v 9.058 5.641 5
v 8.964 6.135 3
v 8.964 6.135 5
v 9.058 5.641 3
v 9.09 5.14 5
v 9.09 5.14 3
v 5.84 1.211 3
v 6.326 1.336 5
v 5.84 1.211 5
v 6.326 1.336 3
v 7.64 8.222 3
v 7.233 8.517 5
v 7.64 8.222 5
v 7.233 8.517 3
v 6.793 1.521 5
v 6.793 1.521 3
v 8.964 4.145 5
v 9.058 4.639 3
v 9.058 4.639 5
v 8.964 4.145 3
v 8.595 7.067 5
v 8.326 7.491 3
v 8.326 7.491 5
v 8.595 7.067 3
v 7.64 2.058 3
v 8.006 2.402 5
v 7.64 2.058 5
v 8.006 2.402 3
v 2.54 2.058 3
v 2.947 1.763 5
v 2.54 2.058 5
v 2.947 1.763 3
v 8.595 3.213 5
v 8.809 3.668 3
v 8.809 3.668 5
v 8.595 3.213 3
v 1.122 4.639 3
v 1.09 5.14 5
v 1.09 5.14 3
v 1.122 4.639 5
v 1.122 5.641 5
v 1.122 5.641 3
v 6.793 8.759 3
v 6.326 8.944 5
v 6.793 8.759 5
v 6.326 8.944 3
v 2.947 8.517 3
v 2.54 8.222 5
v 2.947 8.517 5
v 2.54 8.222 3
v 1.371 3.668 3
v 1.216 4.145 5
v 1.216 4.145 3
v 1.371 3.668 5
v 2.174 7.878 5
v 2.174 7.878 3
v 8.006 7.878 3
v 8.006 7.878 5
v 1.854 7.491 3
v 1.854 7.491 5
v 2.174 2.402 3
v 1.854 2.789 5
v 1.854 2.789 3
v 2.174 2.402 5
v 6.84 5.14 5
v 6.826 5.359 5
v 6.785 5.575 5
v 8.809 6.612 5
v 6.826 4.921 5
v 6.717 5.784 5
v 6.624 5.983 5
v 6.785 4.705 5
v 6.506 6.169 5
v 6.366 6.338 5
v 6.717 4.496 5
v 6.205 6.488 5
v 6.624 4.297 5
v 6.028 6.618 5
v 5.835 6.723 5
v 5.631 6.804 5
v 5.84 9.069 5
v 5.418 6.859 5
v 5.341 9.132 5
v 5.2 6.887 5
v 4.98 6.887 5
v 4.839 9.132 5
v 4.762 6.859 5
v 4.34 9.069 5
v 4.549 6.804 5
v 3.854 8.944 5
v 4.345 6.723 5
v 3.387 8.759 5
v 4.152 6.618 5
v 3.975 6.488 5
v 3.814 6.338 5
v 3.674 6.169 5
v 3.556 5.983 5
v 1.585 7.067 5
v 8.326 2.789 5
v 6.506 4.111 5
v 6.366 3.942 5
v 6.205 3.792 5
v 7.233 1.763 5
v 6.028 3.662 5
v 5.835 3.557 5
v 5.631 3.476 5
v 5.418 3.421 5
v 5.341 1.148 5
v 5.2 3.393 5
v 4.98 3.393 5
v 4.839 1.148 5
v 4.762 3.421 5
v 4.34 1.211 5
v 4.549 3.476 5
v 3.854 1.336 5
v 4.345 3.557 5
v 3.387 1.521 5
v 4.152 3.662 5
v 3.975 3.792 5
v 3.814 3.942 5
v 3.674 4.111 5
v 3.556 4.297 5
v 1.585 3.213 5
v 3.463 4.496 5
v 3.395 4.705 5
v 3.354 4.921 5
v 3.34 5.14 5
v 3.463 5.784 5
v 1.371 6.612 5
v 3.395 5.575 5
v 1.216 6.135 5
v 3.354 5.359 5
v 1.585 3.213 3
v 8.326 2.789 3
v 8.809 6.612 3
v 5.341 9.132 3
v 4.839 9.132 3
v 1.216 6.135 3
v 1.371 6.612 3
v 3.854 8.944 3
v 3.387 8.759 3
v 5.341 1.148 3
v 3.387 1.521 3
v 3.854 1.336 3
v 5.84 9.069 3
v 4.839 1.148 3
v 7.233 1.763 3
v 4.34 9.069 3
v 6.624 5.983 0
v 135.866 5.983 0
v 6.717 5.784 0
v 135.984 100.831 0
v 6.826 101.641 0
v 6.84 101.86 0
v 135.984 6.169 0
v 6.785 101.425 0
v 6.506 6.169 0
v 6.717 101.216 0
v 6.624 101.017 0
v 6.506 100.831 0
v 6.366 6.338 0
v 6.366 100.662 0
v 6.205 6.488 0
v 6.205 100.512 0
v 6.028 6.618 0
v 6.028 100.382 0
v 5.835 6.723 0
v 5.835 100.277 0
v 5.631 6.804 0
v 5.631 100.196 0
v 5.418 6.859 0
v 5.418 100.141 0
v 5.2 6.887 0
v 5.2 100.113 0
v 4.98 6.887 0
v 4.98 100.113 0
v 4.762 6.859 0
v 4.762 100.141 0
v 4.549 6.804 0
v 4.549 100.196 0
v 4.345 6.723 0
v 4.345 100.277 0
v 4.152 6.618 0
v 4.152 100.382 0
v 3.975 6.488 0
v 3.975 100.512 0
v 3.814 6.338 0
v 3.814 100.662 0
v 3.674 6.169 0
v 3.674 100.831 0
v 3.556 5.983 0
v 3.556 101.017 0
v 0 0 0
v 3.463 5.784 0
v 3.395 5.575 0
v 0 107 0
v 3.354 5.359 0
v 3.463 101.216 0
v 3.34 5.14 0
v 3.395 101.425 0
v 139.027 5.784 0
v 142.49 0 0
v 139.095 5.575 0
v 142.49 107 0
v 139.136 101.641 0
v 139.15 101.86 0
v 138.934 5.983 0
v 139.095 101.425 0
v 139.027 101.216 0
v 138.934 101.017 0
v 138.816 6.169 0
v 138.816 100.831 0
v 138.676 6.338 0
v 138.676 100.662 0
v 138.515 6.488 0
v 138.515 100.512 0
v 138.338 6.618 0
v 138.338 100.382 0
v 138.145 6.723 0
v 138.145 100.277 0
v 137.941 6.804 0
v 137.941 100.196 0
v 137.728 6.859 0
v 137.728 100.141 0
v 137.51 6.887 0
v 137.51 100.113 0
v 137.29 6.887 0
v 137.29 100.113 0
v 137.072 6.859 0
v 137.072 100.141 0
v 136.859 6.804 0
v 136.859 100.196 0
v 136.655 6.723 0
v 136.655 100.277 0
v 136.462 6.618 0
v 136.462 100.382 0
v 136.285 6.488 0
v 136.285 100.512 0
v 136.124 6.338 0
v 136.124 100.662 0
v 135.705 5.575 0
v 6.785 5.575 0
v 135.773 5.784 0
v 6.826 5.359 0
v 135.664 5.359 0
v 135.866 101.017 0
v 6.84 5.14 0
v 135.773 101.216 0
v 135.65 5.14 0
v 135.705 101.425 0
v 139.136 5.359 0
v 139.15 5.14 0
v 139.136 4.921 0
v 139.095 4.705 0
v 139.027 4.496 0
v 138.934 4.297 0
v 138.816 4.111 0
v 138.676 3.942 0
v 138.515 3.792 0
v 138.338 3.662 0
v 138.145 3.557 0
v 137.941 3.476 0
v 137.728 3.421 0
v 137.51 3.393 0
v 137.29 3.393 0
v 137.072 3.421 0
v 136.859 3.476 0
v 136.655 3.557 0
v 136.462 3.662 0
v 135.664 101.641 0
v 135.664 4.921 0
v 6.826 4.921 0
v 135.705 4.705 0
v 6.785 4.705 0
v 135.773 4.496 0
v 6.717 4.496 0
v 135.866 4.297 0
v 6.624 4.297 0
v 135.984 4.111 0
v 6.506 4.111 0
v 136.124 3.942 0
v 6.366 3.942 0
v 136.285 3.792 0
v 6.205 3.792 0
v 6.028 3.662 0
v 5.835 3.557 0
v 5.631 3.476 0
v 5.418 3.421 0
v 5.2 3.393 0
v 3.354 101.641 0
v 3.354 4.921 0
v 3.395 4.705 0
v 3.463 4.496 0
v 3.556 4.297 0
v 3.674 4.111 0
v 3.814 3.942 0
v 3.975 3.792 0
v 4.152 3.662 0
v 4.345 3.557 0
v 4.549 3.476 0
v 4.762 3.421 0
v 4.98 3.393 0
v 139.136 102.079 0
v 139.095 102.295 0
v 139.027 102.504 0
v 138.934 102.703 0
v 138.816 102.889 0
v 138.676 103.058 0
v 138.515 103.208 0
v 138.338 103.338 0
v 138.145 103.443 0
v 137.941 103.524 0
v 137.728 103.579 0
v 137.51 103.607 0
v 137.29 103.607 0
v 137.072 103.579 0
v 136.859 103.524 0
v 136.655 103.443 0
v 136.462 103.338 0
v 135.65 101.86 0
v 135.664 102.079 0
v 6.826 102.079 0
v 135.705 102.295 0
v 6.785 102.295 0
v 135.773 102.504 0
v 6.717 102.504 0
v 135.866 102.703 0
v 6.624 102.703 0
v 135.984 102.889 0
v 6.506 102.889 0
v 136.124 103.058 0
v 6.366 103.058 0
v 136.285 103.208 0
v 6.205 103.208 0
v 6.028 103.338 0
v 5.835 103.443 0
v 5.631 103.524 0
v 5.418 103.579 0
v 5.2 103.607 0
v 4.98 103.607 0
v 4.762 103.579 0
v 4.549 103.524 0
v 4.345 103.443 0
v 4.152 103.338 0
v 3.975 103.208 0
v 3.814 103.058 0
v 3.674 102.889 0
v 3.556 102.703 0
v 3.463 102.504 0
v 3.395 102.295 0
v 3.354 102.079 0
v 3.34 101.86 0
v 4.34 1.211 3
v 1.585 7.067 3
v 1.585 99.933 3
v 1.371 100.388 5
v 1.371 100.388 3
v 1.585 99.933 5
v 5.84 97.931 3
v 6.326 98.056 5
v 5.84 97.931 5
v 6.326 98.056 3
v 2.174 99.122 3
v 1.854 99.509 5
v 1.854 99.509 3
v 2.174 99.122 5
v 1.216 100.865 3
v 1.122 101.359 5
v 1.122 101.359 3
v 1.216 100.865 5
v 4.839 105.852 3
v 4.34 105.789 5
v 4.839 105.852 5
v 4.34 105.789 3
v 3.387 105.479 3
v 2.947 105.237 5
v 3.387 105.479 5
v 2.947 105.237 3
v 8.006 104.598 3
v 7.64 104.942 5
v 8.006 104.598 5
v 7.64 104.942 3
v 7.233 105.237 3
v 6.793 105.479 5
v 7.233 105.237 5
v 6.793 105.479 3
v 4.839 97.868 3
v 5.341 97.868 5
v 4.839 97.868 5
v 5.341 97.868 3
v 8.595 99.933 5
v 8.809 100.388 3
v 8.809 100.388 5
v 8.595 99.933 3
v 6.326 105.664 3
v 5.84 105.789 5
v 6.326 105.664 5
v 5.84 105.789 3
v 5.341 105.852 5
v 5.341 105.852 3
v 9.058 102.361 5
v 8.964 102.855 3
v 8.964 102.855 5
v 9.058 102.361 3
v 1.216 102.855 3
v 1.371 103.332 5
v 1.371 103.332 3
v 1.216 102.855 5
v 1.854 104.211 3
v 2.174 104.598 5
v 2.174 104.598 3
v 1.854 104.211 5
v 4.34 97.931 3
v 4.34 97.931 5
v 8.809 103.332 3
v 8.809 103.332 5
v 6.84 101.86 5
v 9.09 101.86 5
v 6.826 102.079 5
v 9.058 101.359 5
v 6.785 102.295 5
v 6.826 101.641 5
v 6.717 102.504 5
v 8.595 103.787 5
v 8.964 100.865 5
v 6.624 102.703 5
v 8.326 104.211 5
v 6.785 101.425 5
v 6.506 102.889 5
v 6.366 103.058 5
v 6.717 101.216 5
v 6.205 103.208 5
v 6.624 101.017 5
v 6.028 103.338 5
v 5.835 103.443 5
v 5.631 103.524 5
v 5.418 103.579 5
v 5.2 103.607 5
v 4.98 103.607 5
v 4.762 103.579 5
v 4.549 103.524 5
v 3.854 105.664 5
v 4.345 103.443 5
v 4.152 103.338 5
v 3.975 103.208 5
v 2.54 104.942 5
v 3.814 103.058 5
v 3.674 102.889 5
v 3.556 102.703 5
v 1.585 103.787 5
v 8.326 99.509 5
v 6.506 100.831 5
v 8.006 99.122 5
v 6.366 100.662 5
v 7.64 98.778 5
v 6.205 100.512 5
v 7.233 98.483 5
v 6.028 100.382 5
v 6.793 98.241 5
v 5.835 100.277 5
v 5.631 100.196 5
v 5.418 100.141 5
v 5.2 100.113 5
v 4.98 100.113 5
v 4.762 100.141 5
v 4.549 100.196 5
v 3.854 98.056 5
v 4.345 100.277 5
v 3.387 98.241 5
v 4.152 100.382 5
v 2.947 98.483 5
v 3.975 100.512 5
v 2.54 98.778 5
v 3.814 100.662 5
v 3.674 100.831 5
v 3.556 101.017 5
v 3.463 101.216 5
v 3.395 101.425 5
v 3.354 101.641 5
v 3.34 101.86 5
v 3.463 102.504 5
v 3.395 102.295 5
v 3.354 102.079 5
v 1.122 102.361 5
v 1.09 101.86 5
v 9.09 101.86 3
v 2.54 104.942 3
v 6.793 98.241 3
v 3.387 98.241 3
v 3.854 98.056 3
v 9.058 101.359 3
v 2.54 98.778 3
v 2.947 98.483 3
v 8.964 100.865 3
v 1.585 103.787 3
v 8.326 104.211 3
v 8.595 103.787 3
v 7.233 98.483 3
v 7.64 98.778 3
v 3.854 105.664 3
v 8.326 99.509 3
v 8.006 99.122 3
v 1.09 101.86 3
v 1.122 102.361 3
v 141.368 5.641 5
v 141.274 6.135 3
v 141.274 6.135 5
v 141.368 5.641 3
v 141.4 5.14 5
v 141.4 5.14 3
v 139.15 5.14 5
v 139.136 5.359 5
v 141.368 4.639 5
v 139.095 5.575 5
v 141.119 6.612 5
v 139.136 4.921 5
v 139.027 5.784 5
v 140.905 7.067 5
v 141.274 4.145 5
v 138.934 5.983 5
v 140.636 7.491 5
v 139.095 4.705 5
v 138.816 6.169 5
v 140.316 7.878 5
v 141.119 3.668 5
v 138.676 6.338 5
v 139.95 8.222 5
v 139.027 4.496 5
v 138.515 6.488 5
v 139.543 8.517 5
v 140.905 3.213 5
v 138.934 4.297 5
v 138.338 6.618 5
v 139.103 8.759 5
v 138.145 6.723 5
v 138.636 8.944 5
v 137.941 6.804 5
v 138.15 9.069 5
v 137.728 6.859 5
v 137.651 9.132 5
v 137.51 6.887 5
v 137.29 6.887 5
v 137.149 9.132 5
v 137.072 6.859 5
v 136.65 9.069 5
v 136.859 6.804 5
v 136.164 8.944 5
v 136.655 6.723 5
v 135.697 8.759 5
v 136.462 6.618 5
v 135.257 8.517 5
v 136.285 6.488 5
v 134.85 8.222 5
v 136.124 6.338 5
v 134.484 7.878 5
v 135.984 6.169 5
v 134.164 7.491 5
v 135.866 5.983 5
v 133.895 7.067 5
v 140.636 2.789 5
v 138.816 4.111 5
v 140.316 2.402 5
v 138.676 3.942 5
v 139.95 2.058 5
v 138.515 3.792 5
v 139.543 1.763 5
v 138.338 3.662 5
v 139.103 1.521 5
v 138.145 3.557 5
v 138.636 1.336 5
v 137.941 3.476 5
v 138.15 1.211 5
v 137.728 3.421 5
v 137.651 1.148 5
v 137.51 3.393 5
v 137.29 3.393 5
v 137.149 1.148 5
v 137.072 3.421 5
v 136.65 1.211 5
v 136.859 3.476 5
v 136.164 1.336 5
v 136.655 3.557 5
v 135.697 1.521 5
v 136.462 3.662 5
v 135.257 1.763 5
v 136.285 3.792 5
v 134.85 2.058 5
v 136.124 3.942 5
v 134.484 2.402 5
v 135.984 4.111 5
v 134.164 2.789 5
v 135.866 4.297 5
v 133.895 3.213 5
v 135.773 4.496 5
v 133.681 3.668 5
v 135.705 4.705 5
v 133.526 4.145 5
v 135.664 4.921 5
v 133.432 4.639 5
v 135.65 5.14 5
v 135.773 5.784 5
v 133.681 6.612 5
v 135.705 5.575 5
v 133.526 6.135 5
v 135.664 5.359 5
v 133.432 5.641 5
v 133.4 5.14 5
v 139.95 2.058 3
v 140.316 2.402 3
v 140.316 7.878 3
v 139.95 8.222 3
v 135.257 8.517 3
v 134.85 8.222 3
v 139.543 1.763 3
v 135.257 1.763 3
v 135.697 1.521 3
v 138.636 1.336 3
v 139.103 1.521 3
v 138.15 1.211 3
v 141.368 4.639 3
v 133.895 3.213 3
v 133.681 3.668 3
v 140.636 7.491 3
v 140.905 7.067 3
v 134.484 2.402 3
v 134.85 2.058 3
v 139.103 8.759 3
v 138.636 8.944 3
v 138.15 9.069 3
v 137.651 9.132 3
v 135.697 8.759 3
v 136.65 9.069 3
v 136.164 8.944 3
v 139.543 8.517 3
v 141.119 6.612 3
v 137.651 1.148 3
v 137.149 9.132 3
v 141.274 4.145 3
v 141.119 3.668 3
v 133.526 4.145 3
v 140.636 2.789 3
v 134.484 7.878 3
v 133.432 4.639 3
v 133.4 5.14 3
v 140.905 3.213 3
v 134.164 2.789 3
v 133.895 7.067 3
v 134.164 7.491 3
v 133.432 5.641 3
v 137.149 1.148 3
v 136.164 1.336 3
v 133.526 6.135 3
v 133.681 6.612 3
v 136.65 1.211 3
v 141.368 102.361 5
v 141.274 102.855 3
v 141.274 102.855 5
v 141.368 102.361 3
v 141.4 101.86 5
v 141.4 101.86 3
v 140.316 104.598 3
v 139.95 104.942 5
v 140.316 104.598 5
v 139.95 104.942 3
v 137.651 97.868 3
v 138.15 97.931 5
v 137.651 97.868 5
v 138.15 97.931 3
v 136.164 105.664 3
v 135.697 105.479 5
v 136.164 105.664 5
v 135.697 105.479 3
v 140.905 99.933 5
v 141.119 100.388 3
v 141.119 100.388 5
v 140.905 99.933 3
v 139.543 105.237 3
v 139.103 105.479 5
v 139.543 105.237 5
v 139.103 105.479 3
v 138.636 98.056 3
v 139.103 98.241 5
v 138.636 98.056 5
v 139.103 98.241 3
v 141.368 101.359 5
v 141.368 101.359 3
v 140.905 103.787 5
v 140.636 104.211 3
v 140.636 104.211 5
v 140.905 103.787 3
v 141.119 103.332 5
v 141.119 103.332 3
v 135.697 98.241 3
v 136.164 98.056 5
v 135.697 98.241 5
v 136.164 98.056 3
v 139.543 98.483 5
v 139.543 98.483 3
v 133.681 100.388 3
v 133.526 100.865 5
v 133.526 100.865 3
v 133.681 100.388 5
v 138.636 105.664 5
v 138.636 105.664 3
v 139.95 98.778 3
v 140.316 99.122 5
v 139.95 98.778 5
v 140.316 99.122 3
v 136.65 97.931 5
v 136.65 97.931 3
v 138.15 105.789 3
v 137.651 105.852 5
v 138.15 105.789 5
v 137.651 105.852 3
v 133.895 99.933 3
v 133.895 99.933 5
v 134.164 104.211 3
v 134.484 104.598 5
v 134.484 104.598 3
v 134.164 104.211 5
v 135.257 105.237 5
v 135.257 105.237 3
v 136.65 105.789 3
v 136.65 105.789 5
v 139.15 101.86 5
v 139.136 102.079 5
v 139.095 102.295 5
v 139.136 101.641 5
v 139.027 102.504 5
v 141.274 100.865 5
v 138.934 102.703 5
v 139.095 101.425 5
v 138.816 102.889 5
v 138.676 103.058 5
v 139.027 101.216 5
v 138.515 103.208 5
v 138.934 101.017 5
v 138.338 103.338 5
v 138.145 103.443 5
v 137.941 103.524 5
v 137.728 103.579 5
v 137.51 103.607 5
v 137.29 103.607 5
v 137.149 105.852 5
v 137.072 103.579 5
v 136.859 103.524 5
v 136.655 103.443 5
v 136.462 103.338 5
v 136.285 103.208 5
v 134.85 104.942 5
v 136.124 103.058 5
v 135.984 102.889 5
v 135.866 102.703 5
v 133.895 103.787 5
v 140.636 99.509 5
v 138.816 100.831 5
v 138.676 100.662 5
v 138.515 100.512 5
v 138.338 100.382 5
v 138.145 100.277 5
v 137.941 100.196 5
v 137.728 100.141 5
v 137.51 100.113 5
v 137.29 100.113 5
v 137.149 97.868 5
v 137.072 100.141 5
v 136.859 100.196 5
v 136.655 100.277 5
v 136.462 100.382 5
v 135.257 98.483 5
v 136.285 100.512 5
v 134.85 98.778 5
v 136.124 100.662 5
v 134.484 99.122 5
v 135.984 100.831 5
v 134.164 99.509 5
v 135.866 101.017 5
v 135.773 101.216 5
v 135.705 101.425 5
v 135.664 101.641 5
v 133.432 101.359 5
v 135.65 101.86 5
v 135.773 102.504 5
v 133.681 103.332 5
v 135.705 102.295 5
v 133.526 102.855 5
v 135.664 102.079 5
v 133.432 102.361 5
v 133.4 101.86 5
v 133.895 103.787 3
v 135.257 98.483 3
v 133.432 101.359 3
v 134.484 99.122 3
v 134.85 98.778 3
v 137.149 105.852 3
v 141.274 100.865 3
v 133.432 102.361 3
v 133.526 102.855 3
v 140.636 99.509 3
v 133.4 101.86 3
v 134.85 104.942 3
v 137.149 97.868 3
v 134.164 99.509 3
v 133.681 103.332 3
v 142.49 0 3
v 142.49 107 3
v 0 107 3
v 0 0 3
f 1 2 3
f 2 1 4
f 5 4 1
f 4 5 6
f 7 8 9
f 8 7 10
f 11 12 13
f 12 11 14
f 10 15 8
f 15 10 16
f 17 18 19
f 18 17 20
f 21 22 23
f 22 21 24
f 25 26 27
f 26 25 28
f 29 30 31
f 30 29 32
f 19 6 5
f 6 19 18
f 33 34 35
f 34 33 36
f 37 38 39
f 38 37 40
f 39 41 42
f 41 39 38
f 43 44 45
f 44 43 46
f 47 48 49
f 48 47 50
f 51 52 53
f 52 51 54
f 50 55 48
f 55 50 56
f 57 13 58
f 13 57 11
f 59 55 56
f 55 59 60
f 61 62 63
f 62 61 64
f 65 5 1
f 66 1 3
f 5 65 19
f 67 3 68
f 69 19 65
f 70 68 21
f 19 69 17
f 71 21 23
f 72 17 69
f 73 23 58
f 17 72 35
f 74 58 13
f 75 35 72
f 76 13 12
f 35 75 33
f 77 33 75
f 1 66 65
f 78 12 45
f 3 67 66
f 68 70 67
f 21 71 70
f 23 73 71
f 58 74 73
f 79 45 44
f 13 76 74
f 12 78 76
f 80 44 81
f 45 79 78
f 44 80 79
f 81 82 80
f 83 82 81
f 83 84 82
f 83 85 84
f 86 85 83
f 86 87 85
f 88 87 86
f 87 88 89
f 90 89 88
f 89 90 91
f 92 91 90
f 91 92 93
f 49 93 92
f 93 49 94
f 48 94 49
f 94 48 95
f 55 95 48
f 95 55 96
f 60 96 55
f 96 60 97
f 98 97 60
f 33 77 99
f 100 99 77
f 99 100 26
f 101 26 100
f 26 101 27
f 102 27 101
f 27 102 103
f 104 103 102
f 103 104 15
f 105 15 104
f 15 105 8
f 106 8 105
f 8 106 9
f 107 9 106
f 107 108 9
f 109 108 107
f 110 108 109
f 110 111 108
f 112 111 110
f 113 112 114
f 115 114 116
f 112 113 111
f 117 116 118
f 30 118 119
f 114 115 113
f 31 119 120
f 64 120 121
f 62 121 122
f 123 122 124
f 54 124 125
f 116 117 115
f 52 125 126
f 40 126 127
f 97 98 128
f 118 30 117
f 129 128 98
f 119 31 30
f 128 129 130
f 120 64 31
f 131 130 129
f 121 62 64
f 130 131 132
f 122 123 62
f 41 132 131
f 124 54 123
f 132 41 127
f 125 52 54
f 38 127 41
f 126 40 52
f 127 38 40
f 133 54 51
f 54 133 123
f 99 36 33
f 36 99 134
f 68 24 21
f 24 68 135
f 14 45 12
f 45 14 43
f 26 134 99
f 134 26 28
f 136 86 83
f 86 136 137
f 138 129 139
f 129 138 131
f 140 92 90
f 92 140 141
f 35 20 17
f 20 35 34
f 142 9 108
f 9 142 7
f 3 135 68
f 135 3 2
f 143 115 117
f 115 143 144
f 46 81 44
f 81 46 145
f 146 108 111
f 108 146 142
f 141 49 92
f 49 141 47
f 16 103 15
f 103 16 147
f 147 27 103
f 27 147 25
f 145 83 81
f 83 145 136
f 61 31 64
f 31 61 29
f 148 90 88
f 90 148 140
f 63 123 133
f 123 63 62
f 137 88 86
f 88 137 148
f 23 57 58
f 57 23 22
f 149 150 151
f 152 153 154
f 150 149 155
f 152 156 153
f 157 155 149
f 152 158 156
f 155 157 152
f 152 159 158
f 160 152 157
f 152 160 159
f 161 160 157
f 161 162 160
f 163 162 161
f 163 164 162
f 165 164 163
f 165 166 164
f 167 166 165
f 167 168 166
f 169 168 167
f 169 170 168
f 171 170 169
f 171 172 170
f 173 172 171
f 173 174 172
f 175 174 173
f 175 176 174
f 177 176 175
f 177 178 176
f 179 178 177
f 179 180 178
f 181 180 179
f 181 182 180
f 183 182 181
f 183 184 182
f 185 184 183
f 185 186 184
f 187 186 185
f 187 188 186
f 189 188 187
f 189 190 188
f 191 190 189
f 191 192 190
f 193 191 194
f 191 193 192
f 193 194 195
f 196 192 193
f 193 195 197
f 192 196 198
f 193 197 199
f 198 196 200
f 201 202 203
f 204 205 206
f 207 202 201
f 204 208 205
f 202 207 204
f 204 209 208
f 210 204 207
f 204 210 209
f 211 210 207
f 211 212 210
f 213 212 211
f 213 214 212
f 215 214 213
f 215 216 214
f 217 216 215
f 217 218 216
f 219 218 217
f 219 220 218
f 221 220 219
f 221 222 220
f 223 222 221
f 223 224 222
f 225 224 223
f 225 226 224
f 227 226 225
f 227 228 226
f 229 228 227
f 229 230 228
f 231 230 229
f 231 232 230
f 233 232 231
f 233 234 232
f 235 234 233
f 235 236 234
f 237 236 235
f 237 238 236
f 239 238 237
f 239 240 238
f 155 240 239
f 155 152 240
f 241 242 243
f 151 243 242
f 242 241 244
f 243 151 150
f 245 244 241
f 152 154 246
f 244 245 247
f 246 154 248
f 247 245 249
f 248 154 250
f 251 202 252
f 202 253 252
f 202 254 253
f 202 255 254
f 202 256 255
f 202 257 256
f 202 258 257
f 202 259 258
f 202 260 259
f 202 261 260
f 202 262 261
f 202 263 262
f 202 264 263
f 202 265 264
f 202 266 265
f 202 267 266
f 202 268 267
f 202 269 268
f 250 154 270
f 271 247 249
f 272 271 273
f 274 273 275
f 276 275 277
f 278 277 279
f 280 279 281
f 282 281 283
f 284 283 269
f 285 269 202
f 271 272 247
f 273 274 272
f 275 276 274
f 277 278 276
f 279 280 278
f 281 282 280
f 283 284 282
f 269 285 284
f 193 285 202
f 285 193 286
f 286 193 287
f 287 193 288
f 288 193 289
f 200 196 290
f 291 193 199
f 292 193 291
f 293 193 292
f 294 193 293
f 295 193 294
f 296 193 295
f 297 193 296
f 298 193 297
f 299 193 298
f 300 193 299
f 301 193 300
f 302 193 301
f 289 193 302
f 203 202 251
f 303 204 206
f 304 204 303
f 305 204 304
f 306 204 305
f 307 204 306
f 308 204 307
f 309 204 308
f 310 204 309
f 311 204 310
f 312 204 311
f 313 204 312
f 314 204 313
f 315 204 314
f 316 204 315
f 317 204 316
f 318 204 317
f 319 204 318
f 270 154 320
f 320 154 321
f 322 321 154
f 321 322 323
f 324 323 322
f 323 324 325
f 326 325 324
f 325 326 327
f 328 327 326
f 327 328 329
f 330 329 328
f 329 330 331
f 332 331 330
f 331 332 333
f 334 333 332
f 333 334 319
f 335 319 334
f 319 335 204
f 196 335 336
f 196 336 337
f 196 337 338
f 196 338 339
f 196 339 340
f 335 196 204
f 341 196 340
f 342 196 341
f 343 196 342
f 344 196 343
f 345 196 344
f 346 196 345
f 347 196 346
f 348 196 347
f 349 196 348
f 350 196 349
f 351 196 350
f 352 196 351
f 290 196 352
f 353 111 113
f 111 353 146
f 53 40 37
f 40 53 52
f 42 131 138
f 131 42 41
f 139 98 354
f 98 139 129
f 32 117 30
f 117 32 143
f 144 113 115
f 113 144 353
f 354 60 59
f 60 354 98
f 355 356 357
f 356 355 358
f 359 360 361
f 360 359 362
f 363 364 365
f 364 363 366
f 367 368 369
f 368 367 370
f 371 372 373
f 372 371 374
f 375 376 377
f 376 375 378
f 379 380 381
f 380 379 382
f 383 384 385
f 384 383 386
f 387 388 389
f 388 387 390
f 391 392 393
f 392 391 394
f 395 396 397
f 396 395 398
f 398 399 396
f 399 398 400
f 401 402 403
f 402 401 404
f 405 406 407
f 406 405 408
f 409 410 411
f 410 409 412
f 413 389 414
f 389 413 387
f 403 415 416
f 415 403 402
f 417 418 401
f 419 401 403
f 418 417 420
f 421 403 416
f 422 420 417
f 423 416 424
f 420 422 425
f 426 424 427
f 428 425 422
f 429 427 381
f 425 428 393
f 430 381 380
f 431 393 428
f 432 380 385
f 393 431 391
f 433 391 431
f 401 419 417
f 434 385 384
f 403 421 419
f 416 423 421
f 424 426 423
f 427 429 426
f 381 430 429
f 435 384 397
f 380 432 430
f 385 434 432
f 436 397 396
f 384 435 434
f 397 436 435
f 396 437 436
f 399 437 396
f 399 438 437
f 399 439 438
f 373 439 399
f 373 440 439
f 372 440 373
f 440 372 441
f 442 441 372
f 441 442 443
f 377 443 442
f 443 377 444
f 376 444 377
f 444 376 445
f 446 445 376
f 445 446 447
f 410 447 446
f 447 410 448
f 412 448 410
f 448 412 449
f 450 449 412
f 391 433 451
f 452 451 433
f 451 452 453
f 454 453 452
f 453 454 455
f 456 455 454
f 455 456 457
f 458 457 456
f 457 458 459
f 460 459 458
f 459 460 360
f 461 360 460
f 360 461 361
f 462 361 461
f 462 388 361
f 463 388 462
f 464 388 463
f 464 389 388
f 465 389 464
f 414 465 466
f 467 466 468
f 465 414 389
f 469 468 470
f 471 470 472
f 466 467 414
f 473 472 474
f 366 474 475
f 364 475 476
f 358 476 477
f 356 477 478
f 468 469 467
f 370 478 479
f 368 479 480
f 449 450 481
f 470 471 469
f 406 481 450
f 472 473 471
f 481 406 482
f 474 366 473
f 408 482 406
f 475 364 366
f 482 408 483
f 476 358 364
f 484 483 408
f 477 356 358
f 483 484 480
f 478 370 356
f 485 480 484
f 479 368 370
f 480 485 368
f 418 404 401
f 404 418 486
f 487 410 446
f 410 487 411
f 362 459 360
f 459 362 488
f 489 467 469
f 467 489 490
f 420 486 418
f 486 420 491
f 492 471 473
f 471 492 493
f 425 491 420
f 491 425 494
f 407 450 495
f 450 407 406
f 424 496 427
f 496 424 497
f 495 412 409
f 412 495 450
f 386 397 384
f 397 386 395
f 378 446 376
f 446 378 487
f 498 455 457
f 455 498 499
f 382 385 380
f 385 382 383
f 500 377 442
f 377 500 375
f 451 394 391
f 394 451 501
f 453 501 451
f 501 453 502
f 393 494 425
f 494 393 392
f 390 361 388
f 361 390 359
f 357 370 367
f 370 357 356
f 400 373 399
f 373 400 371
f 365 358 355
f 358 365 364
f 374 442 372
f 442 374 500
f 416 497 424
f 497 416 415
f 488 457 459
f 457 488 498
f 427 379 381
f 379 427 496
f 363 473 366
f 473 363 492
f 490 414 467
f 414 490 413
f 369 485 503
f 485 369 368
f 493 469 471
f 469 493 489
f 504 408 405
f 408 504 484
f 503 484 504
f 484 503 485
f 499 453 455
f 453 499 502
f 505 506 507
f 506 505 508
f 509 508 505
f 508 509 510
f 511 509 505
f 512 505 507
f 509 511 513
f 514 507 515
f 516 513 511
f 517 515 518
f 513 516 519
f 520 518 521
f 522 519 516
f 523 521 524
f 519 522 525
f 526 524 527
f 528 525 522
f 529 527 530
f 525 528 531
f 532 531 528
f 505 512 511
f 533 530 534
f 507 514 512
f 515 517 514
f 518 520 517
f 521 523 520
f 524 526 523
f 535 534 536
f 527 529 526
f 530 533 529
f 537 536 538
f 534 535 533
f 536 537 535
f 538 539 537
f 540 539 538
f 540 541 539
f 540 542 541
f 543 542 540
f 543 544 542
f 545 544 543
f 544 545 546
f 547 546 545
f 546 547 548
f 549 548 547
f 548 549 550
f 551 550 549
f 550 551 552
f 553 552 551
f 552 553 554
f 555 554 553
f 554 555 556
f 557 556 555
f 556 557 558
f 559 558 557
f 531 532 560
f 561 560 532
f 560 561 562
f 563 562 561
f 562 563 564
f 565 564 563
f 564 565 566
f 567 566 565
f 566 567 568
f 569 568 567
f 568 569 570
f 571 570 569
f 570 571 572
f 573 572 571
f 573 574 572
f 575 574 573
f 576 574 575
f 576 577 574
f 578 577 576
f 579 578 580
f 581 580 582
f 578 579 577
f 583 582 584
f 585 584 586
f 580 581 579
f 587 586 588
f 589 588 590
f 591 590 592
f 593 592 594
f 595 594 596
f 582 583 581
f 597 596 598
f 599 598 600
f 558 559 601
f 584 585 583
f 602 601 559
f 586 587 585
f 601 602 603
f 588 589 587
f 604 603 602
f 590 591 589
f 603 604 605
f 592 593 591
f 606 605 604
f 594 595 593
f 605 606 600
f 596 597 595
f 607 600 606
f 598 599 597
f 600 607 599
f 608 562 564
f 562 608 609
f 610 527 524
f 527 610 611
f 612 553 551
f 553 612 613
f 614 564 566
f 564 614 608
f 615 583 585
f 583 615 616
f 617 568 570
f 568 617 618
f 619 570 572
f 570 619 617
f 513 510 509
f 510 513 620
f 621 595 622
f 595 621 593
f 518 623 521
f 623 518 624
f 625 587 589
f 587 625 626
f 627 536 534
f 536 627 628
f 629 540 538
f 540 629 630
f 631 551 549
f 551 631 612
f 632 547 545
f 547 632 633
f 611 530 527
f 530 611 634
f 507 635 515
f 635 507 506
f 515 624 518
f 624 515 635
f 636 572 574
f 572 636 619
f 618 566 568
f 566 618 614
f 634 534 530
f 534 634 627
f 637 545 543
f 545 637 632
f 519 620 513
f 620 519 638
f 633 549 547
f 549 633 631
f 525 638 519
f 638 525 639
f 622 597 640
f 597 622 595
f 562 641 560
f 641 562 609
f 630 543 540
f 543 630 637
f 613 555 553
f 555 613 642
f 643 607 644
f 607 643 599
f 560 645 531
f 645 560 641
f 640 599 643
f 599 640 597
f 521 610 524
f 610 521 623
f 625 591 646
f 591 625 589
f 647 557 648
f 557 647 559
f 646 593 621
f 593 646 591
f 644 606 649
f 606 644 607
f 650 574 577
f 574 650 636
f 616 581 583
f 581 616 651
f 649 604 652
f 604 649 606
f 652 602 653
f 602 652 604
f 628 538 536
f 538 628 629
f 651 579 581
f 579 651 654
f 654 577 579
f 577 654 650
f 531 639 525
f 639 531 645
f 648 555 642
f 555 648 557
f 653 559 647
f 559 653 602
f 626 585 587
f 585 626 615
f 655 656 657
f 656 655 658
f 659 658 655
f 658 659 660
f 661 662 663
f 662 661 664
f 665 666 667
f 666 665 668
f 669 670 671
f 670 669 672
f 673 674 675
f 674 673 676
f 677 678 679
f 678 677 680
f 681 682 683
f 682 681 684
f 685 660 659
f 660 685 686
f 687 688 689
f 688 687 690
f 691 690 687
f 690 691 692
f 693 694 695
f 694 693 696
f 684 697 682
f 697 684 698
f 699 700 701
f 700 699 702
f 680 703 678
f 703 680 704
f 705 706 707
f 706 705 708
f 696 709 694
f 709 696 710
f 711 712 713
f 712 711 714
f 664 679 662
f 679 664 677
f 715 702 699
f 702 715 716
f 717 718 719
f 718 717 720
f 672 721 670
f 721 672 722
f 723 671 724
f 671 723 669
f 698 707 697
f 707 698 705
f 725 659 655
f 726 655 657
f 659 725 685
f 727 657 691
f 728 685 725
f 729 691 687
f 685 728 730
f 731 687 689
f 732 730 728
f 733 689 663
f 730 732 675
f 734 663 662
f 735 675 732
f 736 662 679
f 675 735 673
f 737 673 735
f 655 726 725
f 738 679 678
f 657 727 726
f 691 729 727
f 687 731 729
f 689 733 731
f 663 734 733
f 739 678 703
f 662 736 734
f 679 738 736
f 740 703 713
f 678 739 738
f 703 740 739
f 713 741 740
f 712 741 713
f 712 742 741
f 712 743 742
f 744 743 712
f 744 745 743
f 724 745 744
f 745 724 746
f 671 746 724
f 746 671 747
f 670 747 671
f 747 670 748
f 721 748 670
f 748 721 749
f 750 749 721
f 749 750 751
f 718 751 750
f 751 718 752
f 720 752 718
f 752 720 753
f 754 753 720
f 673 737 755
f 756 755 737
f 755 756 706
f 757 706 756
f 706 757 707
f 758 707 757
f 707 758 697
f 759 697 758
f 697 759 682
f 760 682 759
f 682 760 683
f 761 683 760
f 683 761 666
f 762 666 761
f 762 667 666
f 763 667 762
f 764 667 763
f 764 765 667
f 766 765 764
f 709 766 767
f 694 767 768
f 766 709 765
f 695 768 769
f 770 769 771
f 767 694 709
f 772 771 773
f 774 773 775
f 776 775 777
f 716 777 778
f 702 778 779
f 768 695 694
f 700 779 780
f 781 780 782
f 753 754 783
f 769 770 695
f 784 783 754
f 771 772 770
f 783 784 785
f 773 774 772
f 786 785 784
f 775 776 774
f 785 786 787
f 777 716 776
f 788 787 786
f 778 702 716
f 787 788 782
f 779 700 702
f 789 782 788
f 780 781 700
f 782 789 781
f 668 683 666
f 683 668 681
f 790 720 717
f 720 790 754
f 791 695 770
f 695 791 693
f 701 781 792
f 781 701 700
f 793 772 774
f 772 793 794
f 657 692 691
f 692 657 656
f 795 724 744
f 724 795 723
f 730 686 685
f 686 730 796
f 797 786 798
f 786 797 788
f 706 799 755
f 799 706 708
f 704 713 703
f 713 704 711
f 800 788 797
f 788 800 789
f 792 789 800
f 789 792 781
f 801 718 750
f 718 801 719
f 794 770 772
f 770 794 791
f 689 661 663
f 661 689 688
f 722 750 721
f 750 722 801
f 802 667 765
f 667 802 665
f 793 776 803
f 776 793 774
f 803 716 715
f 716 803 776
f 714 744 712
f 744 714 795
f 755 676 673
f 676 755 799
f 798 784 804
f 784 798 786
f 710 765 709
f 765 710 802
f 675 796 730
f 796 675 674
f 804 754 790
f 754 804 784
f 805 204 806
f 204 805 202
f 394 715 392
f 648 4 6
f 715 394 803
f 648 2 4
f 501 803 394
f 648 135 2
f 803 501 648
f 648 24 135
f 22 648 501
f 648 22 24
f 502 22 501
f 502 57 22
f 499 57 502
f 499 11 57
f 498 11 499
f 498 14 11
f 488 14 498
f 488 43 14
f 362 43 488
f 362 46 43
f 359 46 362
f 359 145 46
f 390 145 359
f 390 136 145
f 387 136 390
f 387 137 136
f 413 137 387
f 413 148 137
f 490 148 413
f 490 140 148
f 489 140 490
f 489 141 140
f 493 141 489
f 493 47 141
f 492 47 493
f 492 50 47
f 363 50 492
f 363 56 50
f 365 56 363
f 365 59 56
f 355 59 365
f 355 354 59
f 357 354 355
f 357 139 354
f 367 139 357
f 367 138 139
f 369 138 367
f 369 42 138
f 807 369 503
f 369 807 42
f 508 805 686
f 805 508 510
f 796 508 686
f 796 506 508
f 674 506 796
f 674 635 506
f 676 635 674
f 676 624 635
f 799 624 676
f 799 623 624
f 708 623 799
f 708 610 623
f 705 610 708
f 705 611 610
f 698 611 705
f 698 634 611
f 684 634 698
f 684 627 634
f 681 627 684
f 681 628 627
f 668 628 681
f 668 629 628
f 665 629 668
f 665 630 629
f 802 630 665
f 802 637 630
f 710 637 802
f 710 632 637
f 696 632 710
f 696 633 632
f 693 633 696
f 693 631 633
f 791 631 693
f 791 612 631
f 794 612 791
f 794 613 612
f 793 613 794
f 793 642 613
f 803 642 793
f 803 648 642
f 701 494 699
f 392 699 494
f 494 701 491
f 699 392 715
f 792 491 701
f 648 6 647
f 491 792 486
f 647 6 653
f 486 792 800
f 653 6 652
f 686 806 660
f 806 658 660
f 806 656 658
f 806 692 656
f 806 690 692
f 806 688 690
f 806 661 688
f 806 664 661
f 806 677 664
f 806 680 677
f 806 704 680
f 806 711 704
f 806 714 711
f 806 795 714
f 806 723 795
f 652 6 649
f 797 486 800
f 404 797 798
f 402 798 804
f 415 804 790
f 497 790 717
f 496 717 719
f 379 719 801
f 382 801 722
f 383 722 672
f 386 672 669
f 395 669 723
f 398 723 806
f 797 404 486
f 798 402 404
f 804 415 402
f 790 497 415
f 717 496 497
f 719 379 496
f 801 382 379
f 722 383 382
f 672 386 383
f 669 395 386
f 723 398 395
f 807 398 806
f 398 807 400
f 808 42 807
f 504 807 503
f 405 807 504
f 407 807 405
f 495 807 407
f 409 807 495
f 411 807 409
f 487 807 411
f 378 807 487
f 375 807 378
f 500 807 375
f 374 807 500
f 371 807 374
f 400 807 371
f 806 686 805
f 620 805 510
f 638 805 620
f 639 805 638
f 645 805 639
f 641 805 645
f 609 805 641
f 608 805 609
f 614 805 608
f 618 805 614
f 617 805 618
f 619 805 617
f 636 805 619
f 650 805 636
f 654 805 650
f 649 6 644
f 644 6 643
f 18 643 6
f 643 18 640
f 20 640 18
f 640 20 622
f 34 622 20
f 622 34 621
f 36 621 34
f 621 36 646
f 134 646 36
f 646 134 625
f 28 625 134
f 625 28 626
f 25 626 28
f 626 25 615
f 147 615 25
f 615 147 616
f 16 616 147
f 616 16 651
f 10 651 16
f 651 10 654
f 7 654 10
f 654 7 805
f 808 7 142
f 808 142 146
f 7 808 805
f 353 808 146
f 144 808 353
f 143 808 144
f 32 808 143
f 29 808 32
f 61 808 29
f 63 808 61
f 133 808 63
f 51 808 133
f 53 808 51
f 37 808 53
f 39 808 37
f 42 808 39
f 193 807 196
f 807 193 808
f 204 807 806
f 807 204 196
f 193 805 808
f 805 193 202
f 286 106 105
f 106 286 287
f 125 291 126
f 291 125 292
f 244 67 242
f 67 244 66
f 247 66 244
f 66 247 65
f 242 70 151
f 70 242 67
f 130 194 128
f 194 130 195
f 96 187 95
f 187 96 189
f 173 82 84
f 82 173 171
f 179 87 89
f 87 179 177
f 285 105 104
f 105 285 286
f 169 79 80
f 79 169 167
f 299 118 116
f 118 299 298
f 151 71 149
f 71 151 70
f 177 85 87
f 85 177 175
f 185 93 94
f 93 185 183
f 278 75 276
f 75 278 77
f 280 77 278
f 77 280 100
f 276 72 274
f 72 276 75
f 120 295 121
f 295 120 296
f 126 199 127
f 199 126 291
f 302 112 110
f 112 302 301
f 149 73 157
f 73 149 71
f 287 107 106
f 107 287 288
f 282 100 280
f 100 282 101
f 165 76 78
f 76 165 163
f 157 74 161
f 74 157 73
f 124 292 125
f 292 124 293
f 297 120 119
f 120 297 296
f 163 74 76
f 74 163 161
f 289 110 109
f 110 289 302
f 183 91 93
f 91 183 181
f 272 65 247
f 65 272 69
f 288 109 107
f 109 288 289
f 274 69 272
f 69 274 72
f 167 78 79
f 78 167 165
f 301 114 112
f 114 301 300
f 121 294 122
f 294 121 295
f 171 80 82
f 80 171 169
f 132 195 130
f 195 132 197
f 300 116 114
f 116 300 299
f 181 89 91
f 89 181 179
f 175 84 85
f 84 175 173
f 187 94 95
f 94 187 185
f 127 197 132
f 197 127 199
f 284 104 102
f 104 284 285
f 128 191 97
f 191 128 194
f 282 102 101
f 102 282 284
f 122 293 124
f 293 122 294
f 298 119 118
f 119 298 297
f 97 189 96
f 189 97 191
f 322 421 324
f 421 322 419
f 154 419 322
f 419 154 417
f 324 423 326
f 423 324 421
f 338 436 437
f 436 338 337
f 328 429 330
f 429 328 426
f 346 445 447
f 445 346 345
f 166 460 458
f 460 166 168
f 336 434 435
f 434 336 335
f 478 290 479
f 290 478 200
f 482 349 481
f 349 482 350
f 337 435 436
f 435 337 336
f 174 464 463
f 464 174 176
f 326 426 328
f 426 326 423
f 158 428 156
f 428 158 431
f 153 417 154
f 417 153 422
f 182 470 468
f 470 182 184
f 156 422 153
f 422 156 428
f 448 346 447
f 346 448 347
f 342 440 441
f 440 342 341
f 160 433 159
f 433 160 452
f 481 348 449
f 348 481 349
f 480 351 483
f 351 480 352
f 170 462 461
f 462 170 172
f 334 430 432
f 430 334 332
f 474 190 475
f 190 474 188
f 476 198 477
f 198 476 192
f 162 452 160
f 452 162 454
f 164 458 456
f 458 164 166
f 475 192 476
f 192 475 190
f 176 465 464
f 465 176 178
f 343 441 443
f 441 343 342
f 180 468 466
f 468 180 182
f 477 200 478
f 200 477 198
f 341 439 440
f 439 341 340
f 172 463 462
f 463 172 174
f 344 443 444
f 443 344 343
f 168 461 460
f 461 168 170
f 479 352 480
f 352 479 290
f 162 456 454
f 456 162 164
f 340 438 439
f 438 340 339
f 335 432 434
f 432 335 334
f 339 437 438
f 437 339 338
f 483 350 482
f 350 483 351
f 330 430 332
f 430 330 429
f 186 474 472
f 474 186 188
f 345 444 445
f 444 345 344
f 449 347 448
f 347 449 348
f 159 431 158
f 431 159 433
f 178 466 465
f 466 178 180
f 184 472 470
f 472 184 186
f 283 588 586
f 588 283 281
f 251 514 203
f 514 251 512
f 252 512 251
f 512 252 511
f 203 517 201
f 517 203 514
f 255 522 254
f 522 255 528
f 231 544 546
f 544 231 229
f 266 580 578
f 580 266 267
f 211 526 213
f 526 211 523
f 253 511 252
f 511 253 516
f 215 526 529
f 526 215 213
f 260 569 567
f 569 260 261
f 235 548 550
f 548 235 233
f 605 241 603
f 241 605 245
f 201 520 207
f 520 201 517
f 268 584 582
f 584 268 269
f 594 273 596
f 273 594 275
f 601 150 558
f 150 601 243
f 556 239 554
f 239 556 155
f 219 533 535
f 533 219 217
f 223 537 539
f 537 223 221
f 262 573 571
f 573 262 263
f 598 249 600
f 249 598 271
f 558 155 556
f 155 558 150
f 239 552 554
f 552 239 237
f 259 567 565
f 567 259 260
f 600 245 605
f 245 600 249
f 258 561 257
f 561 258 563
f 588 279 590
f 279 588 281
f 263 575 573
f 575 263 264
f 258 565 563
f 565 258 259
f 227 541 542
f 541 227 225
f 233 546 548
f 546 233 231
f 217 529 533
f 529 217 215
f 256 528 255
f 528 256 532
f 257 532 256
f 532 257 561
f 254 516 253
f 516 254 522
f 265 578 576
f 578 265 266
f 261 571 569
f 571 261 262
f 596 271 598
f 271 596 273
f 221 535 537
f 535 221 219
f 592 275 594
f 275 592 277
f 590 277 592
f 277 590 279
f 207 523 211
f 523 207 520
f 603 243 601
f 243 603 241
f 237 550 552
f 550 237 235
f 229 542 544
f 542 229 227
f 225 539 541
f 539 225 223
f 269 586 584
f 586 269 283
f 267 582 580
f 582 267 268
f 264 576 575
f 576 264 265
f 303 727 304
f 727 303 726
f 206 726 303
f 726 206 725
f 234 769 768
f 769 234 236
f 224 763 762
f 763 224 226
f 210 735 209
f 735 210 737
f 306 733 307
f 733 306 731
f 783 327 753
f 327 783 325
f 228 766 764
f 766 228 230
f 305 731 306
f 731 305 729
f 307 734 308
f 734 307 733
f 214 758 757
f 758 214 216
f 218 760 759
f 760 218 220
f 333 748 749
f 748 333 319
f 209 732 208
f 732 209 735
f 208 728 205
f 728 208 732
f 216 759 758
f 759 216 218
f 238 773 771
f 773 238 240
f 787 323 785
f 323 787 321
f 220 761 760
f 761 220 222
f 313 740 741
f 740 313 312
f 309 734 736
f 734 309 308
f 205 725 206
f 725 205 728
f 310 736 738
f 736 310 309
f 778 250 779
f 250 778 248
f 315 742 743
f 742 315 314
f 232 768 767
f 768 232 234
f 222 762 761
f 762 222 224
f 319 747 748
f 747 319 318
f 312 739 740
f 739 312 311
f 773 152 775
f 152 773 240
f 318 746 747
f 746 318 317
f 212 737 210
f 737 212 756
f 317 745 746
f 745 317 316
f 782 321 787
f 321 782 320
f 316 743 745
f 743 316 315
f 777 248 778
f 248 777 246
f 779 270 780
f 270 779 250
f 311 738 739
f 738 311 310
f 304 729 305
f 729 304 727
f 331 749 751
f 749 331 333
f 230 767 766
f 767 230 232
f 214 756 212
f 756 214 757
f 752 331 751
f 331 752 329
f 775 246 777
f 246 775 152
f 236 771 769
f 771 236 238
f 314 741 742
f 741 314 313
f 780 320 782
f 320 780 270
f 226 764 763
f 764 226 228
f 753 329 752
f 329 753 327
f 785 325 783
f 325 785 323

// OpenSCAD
//Grundplatte für ZIO 1616
plaenge=142.49;  // Platinenlänge
pbreite=107;   // Platinenbreite
llaenge=132.31;  // Lochabstand in Längsrichtung
lbreite=96.72;   // Lochabstand in Querrichtung
pbohrung=4;    // Lochdurchmesser in Platine

daufnahme=8;   // Aussendm Schraubenaufnahme
haufnahme=5;   // Höhe der Schraubenaufnahme
boden=3;

schraubendm=3.5;

$fn=50;

%translate([0,0,haufnahme]) cube([plaenge,pbreite,2]);

module platte_add() {
cube([plaenge,pbreite,boden]);
for (x=[0:1])
    for (y=[0:1])
        translate([(plaenge-llaenge)/2+x*llaenge,(pbreite-lbreite)/2+y*lbreite,0]) cylinder(d=daufnahme,h=haufnahme);
}

module platte_sub() {
for (x=[0:1])
    for (y=[0:1])
        translate([(plaenge-llaenge)/2+x*llaenge,(pbreite-lbreite)/2+y*lbreite,0]) cylinder(d=schraubendm,h=haufnahme);
}

difference() {
    platte_add();
    platte_sub();
}
